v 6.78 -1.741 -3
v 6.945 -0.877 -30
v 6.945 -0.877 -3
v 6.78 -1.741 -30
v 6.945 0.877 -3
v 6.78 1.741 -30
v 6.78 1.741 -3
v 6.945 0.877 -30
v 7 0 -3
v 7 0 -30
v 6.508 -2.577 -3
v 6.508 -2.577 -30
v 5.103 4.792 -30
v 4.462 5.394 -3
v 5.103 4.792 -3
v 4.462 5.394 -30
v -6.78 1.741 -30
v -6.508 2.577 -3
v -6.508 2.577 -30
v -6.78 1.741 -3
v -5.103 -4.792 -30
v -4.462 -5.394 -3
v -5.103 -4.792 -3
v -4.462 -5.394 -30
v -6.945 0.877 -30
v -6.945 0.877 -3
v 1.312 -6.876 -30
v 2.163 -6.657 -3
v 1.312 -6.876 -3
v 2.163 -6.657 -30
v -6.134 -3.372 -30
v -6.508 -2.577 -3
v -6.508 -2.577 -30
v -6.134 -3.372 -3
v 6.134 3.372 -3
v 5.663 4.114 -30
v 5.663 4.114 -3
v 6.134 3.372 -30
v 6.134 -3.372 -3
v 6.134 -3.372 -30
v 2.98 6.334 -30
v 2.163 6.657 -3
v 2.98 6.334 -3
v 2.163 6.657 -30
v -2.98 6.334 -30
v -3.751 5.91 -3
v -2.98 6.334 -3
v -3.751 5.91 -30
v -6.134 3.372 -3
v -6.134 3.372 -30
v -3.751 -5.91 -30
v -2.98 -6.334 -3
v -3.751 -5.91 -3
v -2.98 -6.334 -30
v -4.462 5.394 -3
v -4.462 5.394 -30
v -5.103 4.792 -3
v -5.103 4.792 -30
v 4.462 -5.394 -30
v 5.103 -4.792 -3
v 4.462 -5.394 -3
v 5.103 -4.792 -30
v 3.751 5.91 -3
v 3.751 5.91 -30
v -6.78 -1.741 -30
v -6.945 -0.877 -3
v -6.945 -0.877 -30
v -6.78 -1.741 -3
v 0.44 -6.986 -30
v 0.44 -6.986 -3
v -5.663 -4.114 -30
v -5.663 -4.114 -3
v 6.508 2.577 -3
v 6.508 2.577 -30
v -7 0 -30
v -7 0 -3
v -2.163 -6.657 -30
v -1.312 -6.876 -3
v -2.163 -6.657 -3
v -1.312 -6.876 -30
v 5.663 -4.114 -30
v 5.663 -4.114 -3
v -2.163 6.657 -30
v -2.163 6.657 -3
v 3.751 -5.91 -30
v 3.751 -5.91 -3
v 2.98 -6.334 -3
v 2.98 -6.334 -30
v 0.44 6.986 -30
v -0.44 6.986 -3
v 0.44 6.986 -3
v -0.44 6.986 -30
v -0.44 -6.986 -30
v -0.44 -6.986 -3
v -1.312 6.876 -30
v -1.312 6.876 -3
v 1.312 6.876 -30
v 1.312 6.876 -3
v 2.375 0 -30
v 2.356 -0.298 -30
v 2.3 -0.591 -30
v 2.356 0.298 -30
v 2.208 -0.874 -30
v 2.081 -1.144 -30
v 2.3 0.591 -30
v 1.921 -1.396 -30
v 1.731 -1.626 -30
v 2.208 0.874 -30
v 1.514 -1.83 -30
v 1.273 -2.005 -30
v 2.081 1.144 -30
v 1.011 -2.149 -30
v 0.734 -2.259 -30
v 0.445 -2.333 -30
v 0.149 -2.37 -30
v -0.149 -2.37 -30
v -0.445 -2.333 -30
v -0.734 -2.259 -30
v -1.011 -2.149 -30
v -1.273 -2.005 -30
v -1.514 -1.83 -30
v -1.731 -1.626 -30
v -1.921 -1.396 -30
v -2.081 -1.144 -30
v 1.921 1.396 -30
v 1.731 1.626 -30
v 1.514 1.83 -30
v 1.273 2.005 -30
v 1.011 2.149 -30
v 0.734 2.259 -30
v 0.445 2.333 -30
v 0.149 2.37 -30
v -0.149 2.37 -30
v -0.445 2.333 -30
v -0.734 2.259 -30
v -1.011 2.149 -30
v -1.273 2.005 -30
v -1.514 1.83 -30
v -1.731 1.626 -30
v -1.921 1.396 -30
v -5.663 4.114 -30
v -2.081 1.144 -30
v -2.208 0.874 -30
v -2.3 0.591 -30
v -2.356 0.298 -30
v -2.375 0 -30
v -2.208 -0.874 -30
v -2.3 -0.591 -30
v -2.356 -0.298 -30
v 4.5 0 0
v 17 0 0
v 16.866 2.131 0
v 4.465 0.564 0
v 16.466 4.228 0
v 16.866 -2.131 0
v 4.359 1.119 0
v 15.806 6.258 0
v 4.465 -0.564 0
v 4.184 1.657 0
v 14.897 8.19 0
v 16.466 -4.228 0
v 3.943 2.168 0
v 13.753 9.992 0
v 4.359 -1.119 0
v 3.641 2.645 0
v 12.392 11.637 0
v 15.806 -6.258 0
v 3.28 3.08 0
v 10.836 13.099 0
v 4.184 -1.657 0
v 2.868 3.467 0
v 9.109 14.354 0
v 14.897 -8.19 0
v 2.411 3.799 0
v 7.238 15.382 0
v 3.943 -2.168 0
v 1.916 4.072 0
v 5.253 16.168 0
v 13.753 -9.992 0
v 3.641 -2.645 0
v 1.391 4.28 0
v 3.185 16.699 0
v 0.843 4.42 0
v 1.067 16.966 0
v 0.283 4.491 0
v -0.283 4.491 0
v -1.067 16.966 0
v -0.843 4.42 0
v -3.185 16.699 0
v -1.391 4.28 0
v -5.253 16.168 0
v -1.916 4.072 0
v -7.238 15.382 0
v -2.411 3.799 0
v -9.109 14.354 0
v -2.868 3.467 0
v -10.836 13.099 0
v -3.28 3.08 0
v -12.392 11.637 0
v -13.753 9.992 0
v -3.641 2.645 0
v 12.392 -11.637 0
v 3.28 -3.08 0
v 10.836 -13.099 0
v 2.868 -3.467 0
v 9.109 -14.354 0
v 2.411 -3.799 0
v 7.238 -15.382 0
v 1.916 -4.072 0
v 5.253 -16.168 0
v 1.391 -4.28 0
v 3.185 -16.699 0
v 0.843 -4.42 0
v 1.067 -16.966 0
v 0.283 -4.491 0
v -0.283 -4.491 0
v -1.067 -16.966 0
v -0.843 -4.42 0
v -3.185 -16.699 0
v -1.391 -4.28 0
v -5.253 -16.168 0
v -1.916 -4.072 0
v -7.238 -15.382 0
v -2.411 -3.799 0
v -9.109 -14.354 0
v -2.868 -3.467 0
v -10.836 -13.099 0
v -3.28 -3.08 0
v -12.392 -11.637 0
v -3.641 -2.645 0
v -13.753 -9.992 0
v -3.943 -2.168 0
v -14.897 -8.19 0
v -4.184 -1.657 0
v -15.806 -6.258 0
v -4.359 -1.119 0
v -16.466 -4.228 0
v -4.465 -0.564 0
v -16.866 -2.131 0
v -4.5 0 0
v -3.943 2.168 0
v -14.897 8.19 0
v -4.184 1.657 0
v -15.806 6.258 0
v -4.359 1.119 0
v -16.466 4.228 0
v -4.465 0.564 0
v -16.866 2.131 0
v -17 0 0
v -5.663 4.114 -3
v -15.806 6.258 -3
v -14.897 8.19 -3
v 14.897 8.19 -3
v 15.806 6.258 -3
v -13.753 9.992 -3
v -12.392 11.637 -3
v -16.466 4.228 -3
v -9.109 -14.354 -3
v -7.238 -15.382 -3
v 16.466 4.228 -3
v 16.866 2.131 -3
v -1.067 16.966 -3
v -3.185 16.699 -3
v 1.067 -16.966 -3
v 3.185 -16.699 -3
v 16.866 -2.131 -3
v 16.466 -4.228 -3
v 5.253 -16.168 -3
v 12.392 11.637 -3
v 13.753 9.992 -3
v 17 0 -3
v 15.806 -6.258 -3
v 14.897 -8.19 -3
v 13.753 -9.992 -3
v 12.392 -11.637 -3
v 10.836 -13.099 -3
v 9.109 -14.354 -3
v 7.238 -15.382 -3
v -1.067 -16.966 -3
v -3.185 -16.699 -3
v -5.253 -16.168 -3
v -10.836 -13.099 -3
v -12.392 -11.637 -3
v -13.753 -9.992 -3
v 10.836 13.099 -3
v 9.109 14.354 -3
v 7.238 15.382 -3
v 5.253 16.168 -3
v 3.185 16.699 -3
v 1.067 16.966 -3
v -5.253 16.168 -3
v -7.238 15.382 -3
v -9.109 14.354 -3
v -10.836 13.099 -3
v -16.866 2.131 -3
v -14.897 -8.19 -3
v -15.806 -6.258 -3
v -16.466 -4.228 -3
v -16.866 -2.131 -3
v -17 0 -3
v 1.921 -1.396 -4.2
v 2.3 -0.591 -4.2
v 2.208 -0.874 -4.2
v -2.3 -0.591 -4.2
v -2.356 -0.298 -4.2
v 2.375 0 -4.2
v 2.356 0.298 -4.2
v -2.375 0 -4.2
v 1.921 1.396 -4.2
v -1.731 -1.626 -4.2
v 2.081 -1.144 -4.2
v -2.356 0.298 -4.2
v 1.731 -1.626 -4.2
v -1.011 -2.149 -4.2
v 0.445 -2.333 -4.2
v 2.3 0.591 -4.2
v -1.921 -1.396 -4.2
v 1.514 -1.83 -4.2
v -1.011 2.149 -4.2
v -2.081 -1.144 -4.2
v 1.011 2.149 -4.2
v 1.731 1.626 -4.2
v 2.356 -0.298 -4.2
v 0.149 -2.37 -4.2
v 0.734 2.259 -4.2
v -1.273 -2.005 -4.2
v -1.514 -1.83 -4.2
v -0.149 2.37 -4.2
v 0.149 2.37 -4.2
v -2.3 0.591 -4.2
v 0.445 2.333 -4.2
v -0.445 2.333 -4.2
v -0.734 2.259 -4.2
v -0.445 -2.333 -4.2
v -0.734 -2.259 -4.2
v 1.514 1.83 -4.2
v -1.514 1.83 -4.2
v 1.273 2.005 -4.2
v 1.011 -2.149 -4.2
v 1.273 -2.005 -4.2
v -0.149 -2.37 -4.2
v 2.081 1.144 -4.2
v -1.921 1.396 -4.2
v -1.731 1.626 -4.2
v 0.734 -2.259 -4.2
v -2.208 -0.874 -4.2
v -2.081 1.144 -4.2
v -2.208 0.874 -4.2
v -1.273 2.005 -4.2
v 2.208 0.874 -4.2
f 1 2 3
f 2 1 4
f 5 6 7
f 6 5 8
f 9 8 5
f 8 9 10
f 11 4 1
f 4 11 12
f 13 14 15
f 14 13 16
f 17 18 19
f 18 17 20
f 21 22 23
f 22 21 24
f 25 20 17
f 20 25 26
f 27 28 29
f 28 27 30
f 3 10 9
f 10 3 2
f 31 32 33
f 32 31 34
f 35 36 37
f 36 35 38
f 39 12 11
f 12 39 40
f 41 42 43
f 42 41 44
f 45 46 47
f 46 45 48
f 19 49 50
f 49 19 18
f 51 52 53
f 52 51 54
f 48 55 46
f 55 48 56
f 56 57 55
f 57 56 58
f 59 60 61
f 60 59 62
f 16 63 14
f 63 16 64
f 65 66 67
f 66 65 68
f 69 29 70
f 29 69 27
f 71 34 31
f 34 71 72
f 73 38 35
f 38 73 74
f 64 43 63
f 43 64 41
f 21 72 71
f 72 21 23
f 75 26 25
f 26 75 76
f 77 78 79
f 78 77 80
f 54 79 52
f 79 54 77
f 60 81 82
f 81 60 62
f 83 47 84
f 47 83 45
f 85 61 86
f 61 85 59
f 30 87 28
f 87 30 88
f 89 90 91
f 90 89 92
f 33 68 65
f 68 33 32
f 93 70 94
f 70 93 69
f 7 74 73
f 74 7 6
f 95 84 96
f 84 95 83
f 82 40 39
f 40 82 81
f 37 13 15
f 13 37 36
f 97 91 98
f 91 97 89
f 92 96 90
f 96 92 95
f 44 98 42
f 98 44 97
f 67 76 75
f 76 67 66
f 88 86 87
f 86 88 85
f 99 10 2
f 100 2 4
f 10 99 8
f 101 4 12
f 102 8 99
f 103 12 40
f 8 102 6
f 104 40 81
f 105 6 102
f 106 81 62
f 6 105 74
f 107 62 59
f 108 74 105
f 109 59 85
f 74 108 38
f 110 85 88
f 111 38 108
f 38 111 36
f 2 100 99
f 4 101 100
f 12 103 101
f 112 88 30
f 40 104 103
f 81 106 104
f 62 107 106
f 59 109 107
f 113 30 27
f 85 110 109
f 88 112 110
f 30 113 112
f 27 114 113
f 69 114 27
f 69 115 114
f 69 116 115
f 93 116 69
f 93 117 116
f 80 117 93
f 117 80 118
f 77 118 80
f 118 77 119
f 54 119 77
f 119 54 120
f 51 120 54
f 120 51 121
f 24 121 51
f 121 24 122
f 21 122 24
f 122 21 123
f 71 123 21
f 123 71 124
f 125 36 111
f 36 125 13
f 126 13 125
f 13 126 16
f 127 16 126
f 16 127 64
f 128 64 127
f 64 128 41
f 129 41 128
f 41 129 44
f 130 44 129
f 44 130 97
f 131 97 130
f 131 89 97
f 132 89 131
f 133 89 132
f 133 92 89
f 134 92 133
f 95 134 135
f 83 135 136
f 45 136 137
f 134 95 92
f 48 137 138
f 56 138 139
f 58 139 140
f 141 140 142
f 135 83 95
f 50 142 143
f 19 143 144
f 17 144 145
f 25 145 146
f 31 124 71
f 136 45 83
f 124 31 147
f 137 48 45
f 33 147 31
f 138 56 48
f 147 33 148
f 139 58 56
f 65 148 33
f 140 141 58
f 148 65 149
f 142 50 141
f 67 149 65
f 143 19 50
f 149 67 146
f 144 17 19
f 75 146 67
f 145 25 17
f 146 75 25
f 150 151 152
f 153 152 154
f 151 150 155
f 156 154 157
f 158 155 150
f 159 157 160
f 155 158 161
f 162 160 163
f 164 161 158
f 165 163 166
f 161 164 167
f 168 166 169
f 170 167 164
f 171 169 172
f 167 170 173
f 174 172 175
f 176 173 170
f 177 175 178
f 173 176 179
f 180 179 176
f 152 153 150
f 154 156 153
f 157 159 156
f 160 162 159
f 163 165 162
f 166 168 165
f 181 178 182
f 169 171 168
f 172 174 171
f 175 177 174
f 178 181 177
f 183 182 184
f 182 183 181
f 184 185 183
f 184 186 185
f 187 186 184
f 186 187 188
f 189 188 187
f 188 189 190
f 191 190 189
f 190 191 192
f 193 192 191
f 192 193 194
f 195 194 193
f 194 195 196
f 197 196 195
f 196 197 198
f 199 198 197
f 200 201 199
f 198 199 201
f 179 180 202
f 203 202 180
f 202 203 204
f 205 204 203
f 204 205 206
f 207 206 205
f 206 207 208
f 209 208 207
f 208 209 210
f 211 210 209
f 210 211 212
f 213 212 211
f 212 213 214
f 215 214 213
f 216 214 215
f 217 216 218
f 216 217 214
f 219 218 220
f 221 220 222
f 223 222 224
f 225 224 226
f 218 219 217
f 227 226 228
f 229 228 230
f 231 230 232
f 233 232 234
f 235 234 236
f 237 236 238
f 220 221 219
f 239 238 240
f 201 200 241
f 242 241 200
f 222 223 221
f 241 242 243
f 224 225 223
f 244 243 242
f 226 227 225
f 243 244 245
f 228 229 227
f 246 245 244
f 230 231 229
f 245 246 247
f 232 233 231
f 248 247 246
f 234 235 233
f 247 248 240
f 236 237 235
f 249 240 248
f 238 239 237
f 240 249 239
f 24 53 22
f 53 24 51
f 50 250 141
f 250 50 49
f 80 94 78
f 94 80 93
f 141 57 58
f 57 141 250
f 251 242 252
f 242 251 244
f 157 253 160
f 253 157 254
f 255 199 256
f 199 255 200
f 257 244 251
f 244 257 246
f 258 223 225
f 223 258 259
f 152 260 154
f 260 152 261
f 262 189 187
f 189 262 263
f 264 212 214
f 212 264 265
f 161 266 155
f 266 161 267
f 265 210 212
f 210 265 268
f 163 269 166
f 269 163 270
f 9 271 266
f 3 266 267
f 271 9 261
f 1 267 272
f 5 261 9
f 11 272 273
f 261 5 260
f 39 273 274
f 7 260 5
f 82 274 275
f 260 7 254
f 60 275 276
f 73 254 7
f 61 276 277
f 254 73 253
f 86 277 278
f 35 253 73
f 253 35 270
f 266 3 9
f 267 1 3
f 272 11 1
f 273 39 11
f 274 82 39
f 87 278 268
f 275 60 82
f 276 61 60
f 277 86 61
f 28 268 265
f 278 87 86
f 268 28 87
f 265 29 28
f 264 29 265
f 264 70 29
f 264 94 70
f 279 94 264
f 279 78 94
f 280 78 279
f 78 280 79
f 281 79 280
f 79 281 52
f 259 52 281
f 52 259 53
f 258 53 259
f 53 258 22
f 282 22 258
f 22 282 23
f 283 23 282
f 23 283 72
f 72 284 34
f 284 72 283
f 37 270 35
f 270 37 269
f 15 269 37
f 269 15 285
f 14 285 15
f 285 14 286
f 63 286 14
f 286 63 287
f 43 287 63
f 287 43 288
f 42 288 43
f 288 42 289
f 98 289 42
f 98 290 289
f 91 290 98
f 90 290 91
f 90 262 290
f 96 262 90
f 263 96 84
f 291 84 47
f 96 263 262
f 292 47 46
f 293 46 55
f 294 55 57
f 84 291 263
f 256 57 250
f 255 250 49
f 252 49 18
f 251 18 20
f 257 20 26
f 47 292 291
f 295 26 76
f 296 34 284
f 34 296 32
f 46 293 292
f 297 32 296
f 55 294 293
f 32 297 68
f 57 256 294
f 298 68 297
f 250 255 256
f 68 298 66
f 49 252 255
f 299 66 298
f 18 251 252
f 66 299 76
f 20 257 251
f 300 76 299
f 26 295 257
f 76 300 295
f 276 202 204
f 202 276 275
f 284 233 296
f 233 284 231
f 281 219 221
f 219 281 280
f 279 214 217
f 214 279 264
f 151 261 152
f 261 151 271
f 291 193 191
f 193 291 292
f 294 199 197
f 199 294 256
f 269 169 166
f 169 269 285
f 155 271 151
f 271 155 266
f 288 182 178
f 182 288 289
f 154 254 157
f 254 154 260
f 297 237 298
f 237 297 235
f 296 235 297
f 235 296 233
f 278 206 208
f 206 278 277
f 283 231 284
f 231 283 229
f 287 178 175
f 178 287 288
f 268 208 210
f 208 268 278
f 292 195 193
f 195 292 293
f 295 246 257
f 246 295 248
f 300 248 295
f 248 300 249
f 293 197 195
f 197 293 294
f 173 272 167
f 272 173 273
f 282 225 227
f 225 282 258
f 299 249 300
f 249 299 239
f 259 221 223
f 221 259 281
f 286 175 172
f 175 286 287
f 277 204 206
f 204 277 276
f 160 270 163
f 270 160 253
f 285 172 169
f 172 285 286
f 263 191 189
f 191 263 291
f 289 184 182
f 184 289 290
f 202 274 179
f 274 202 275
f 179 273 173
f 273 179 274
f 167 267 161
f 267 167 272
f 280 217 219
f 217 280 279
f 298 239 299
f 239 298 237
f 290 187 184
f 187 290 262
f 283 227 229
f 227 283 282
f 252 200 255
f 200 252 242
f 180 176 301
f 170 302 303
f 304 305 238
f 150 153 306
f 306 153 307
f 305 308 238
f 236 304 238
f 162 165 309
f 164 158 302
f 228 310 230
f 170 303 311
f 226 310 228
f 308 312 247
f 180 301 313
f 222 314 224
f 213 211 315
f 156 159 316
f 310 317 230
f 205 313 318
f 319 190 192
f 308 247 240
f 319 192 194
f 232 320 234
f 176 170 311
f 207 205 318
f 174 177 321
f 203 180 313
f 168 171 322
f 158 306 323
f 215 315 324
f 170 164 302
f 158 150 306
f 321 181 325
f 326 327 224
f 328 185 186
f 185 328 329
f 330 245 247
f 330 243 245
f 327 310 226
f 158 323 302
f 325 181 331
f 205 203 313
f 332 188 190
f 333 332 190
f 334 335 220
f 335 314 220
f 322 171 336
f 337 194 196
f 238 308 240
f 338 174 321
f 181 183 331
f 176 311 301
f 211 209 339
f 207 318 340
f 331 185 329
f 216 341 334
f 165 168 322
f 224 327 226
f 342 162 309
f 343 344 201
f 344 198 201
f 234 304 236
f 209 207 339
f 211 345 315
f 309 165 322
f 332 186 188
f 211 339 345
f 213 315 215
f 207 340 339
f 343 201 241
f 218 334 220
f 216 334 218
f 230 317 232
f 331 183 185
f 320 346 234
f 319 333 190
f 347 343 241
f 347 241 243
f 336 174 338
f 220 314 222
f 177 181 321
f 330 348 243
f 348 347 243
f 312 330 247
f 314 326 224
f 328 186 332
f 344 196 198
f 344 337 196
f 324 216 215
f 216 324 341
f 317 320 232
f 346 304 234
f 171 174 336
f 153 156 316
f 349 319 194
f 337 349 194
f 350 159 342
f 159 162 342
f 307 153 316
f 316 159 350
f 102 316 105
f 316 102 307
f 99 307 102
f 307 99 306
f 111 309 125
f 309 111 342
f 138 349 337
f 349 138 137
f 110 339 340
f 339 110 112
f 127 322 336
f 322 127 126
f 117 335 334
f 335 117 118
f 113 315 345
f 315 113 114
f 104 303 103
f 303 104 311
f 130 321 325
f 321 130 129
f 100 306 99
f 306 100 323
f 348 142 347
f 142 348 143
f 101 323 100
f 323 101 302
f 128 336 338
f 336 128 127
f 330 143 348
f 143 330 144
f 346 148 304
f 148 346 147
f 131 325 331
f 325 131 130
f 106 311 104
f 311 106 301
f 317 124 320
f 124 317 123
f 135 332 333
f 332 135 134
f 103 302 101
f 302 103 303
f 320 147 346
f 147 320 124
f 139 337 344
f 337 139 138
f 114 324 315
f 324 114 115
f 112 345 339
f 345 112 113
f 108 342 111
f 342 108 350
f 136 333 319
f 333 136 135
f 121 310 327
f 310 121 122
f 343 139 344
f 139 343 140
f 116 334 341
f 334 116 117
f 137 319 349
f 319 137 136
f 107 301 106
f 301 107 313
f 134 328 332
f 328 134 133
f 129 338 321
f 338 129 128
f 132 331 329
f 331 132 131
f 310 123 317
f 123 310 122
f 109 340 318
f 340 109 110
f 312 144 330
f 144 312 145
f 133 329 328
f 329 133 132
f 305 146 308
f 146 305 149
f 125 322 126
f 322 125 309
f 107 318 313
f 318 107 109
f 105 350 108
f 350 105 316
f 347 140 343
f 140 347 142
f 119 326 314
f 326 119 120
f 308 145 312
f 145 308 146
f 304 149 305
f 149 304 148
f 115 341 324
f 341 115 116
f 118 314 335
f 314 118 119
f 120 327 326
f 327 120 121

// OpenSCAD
$fn = 50;


difference() {
	union() {
		translate(v = [0, 0, -30.0000000000]) {
			cylinder(h = 30, r = 7.0000000000);
		}
		translate(v = [0, 0, -3.0000000000]) {
			cylinder(h = 3, r = 17.0000000000);
		}
	}
	union() {
		translate(v = [0, 0, 0]) {
			rotate(a = [0, 0, 0]) {
				difference() {
					union() {
						#translate(v = [0, 0, -30.0000000000]) {
							cylinder(h = 30, r = 2.2500000000);
						}
						#translate(v = [0, 0, -4.2000000000]) {
							cylinder(h = 4.2000000000, r = 7.0000000000, r1 = 2.3750000000, r2 = 4.5000000000);
						}
						#translate(v = [0, 0, -30.0000000000]) {
							cylinder(h = 30, r = 2.3750000000);
						}
						#translate(v = [0, 0, -30.0000000000]) {
							cylinder(h = 30, r = 2.2500000000);
						}
					}
					union();
				}
			}
		}
	}
}
